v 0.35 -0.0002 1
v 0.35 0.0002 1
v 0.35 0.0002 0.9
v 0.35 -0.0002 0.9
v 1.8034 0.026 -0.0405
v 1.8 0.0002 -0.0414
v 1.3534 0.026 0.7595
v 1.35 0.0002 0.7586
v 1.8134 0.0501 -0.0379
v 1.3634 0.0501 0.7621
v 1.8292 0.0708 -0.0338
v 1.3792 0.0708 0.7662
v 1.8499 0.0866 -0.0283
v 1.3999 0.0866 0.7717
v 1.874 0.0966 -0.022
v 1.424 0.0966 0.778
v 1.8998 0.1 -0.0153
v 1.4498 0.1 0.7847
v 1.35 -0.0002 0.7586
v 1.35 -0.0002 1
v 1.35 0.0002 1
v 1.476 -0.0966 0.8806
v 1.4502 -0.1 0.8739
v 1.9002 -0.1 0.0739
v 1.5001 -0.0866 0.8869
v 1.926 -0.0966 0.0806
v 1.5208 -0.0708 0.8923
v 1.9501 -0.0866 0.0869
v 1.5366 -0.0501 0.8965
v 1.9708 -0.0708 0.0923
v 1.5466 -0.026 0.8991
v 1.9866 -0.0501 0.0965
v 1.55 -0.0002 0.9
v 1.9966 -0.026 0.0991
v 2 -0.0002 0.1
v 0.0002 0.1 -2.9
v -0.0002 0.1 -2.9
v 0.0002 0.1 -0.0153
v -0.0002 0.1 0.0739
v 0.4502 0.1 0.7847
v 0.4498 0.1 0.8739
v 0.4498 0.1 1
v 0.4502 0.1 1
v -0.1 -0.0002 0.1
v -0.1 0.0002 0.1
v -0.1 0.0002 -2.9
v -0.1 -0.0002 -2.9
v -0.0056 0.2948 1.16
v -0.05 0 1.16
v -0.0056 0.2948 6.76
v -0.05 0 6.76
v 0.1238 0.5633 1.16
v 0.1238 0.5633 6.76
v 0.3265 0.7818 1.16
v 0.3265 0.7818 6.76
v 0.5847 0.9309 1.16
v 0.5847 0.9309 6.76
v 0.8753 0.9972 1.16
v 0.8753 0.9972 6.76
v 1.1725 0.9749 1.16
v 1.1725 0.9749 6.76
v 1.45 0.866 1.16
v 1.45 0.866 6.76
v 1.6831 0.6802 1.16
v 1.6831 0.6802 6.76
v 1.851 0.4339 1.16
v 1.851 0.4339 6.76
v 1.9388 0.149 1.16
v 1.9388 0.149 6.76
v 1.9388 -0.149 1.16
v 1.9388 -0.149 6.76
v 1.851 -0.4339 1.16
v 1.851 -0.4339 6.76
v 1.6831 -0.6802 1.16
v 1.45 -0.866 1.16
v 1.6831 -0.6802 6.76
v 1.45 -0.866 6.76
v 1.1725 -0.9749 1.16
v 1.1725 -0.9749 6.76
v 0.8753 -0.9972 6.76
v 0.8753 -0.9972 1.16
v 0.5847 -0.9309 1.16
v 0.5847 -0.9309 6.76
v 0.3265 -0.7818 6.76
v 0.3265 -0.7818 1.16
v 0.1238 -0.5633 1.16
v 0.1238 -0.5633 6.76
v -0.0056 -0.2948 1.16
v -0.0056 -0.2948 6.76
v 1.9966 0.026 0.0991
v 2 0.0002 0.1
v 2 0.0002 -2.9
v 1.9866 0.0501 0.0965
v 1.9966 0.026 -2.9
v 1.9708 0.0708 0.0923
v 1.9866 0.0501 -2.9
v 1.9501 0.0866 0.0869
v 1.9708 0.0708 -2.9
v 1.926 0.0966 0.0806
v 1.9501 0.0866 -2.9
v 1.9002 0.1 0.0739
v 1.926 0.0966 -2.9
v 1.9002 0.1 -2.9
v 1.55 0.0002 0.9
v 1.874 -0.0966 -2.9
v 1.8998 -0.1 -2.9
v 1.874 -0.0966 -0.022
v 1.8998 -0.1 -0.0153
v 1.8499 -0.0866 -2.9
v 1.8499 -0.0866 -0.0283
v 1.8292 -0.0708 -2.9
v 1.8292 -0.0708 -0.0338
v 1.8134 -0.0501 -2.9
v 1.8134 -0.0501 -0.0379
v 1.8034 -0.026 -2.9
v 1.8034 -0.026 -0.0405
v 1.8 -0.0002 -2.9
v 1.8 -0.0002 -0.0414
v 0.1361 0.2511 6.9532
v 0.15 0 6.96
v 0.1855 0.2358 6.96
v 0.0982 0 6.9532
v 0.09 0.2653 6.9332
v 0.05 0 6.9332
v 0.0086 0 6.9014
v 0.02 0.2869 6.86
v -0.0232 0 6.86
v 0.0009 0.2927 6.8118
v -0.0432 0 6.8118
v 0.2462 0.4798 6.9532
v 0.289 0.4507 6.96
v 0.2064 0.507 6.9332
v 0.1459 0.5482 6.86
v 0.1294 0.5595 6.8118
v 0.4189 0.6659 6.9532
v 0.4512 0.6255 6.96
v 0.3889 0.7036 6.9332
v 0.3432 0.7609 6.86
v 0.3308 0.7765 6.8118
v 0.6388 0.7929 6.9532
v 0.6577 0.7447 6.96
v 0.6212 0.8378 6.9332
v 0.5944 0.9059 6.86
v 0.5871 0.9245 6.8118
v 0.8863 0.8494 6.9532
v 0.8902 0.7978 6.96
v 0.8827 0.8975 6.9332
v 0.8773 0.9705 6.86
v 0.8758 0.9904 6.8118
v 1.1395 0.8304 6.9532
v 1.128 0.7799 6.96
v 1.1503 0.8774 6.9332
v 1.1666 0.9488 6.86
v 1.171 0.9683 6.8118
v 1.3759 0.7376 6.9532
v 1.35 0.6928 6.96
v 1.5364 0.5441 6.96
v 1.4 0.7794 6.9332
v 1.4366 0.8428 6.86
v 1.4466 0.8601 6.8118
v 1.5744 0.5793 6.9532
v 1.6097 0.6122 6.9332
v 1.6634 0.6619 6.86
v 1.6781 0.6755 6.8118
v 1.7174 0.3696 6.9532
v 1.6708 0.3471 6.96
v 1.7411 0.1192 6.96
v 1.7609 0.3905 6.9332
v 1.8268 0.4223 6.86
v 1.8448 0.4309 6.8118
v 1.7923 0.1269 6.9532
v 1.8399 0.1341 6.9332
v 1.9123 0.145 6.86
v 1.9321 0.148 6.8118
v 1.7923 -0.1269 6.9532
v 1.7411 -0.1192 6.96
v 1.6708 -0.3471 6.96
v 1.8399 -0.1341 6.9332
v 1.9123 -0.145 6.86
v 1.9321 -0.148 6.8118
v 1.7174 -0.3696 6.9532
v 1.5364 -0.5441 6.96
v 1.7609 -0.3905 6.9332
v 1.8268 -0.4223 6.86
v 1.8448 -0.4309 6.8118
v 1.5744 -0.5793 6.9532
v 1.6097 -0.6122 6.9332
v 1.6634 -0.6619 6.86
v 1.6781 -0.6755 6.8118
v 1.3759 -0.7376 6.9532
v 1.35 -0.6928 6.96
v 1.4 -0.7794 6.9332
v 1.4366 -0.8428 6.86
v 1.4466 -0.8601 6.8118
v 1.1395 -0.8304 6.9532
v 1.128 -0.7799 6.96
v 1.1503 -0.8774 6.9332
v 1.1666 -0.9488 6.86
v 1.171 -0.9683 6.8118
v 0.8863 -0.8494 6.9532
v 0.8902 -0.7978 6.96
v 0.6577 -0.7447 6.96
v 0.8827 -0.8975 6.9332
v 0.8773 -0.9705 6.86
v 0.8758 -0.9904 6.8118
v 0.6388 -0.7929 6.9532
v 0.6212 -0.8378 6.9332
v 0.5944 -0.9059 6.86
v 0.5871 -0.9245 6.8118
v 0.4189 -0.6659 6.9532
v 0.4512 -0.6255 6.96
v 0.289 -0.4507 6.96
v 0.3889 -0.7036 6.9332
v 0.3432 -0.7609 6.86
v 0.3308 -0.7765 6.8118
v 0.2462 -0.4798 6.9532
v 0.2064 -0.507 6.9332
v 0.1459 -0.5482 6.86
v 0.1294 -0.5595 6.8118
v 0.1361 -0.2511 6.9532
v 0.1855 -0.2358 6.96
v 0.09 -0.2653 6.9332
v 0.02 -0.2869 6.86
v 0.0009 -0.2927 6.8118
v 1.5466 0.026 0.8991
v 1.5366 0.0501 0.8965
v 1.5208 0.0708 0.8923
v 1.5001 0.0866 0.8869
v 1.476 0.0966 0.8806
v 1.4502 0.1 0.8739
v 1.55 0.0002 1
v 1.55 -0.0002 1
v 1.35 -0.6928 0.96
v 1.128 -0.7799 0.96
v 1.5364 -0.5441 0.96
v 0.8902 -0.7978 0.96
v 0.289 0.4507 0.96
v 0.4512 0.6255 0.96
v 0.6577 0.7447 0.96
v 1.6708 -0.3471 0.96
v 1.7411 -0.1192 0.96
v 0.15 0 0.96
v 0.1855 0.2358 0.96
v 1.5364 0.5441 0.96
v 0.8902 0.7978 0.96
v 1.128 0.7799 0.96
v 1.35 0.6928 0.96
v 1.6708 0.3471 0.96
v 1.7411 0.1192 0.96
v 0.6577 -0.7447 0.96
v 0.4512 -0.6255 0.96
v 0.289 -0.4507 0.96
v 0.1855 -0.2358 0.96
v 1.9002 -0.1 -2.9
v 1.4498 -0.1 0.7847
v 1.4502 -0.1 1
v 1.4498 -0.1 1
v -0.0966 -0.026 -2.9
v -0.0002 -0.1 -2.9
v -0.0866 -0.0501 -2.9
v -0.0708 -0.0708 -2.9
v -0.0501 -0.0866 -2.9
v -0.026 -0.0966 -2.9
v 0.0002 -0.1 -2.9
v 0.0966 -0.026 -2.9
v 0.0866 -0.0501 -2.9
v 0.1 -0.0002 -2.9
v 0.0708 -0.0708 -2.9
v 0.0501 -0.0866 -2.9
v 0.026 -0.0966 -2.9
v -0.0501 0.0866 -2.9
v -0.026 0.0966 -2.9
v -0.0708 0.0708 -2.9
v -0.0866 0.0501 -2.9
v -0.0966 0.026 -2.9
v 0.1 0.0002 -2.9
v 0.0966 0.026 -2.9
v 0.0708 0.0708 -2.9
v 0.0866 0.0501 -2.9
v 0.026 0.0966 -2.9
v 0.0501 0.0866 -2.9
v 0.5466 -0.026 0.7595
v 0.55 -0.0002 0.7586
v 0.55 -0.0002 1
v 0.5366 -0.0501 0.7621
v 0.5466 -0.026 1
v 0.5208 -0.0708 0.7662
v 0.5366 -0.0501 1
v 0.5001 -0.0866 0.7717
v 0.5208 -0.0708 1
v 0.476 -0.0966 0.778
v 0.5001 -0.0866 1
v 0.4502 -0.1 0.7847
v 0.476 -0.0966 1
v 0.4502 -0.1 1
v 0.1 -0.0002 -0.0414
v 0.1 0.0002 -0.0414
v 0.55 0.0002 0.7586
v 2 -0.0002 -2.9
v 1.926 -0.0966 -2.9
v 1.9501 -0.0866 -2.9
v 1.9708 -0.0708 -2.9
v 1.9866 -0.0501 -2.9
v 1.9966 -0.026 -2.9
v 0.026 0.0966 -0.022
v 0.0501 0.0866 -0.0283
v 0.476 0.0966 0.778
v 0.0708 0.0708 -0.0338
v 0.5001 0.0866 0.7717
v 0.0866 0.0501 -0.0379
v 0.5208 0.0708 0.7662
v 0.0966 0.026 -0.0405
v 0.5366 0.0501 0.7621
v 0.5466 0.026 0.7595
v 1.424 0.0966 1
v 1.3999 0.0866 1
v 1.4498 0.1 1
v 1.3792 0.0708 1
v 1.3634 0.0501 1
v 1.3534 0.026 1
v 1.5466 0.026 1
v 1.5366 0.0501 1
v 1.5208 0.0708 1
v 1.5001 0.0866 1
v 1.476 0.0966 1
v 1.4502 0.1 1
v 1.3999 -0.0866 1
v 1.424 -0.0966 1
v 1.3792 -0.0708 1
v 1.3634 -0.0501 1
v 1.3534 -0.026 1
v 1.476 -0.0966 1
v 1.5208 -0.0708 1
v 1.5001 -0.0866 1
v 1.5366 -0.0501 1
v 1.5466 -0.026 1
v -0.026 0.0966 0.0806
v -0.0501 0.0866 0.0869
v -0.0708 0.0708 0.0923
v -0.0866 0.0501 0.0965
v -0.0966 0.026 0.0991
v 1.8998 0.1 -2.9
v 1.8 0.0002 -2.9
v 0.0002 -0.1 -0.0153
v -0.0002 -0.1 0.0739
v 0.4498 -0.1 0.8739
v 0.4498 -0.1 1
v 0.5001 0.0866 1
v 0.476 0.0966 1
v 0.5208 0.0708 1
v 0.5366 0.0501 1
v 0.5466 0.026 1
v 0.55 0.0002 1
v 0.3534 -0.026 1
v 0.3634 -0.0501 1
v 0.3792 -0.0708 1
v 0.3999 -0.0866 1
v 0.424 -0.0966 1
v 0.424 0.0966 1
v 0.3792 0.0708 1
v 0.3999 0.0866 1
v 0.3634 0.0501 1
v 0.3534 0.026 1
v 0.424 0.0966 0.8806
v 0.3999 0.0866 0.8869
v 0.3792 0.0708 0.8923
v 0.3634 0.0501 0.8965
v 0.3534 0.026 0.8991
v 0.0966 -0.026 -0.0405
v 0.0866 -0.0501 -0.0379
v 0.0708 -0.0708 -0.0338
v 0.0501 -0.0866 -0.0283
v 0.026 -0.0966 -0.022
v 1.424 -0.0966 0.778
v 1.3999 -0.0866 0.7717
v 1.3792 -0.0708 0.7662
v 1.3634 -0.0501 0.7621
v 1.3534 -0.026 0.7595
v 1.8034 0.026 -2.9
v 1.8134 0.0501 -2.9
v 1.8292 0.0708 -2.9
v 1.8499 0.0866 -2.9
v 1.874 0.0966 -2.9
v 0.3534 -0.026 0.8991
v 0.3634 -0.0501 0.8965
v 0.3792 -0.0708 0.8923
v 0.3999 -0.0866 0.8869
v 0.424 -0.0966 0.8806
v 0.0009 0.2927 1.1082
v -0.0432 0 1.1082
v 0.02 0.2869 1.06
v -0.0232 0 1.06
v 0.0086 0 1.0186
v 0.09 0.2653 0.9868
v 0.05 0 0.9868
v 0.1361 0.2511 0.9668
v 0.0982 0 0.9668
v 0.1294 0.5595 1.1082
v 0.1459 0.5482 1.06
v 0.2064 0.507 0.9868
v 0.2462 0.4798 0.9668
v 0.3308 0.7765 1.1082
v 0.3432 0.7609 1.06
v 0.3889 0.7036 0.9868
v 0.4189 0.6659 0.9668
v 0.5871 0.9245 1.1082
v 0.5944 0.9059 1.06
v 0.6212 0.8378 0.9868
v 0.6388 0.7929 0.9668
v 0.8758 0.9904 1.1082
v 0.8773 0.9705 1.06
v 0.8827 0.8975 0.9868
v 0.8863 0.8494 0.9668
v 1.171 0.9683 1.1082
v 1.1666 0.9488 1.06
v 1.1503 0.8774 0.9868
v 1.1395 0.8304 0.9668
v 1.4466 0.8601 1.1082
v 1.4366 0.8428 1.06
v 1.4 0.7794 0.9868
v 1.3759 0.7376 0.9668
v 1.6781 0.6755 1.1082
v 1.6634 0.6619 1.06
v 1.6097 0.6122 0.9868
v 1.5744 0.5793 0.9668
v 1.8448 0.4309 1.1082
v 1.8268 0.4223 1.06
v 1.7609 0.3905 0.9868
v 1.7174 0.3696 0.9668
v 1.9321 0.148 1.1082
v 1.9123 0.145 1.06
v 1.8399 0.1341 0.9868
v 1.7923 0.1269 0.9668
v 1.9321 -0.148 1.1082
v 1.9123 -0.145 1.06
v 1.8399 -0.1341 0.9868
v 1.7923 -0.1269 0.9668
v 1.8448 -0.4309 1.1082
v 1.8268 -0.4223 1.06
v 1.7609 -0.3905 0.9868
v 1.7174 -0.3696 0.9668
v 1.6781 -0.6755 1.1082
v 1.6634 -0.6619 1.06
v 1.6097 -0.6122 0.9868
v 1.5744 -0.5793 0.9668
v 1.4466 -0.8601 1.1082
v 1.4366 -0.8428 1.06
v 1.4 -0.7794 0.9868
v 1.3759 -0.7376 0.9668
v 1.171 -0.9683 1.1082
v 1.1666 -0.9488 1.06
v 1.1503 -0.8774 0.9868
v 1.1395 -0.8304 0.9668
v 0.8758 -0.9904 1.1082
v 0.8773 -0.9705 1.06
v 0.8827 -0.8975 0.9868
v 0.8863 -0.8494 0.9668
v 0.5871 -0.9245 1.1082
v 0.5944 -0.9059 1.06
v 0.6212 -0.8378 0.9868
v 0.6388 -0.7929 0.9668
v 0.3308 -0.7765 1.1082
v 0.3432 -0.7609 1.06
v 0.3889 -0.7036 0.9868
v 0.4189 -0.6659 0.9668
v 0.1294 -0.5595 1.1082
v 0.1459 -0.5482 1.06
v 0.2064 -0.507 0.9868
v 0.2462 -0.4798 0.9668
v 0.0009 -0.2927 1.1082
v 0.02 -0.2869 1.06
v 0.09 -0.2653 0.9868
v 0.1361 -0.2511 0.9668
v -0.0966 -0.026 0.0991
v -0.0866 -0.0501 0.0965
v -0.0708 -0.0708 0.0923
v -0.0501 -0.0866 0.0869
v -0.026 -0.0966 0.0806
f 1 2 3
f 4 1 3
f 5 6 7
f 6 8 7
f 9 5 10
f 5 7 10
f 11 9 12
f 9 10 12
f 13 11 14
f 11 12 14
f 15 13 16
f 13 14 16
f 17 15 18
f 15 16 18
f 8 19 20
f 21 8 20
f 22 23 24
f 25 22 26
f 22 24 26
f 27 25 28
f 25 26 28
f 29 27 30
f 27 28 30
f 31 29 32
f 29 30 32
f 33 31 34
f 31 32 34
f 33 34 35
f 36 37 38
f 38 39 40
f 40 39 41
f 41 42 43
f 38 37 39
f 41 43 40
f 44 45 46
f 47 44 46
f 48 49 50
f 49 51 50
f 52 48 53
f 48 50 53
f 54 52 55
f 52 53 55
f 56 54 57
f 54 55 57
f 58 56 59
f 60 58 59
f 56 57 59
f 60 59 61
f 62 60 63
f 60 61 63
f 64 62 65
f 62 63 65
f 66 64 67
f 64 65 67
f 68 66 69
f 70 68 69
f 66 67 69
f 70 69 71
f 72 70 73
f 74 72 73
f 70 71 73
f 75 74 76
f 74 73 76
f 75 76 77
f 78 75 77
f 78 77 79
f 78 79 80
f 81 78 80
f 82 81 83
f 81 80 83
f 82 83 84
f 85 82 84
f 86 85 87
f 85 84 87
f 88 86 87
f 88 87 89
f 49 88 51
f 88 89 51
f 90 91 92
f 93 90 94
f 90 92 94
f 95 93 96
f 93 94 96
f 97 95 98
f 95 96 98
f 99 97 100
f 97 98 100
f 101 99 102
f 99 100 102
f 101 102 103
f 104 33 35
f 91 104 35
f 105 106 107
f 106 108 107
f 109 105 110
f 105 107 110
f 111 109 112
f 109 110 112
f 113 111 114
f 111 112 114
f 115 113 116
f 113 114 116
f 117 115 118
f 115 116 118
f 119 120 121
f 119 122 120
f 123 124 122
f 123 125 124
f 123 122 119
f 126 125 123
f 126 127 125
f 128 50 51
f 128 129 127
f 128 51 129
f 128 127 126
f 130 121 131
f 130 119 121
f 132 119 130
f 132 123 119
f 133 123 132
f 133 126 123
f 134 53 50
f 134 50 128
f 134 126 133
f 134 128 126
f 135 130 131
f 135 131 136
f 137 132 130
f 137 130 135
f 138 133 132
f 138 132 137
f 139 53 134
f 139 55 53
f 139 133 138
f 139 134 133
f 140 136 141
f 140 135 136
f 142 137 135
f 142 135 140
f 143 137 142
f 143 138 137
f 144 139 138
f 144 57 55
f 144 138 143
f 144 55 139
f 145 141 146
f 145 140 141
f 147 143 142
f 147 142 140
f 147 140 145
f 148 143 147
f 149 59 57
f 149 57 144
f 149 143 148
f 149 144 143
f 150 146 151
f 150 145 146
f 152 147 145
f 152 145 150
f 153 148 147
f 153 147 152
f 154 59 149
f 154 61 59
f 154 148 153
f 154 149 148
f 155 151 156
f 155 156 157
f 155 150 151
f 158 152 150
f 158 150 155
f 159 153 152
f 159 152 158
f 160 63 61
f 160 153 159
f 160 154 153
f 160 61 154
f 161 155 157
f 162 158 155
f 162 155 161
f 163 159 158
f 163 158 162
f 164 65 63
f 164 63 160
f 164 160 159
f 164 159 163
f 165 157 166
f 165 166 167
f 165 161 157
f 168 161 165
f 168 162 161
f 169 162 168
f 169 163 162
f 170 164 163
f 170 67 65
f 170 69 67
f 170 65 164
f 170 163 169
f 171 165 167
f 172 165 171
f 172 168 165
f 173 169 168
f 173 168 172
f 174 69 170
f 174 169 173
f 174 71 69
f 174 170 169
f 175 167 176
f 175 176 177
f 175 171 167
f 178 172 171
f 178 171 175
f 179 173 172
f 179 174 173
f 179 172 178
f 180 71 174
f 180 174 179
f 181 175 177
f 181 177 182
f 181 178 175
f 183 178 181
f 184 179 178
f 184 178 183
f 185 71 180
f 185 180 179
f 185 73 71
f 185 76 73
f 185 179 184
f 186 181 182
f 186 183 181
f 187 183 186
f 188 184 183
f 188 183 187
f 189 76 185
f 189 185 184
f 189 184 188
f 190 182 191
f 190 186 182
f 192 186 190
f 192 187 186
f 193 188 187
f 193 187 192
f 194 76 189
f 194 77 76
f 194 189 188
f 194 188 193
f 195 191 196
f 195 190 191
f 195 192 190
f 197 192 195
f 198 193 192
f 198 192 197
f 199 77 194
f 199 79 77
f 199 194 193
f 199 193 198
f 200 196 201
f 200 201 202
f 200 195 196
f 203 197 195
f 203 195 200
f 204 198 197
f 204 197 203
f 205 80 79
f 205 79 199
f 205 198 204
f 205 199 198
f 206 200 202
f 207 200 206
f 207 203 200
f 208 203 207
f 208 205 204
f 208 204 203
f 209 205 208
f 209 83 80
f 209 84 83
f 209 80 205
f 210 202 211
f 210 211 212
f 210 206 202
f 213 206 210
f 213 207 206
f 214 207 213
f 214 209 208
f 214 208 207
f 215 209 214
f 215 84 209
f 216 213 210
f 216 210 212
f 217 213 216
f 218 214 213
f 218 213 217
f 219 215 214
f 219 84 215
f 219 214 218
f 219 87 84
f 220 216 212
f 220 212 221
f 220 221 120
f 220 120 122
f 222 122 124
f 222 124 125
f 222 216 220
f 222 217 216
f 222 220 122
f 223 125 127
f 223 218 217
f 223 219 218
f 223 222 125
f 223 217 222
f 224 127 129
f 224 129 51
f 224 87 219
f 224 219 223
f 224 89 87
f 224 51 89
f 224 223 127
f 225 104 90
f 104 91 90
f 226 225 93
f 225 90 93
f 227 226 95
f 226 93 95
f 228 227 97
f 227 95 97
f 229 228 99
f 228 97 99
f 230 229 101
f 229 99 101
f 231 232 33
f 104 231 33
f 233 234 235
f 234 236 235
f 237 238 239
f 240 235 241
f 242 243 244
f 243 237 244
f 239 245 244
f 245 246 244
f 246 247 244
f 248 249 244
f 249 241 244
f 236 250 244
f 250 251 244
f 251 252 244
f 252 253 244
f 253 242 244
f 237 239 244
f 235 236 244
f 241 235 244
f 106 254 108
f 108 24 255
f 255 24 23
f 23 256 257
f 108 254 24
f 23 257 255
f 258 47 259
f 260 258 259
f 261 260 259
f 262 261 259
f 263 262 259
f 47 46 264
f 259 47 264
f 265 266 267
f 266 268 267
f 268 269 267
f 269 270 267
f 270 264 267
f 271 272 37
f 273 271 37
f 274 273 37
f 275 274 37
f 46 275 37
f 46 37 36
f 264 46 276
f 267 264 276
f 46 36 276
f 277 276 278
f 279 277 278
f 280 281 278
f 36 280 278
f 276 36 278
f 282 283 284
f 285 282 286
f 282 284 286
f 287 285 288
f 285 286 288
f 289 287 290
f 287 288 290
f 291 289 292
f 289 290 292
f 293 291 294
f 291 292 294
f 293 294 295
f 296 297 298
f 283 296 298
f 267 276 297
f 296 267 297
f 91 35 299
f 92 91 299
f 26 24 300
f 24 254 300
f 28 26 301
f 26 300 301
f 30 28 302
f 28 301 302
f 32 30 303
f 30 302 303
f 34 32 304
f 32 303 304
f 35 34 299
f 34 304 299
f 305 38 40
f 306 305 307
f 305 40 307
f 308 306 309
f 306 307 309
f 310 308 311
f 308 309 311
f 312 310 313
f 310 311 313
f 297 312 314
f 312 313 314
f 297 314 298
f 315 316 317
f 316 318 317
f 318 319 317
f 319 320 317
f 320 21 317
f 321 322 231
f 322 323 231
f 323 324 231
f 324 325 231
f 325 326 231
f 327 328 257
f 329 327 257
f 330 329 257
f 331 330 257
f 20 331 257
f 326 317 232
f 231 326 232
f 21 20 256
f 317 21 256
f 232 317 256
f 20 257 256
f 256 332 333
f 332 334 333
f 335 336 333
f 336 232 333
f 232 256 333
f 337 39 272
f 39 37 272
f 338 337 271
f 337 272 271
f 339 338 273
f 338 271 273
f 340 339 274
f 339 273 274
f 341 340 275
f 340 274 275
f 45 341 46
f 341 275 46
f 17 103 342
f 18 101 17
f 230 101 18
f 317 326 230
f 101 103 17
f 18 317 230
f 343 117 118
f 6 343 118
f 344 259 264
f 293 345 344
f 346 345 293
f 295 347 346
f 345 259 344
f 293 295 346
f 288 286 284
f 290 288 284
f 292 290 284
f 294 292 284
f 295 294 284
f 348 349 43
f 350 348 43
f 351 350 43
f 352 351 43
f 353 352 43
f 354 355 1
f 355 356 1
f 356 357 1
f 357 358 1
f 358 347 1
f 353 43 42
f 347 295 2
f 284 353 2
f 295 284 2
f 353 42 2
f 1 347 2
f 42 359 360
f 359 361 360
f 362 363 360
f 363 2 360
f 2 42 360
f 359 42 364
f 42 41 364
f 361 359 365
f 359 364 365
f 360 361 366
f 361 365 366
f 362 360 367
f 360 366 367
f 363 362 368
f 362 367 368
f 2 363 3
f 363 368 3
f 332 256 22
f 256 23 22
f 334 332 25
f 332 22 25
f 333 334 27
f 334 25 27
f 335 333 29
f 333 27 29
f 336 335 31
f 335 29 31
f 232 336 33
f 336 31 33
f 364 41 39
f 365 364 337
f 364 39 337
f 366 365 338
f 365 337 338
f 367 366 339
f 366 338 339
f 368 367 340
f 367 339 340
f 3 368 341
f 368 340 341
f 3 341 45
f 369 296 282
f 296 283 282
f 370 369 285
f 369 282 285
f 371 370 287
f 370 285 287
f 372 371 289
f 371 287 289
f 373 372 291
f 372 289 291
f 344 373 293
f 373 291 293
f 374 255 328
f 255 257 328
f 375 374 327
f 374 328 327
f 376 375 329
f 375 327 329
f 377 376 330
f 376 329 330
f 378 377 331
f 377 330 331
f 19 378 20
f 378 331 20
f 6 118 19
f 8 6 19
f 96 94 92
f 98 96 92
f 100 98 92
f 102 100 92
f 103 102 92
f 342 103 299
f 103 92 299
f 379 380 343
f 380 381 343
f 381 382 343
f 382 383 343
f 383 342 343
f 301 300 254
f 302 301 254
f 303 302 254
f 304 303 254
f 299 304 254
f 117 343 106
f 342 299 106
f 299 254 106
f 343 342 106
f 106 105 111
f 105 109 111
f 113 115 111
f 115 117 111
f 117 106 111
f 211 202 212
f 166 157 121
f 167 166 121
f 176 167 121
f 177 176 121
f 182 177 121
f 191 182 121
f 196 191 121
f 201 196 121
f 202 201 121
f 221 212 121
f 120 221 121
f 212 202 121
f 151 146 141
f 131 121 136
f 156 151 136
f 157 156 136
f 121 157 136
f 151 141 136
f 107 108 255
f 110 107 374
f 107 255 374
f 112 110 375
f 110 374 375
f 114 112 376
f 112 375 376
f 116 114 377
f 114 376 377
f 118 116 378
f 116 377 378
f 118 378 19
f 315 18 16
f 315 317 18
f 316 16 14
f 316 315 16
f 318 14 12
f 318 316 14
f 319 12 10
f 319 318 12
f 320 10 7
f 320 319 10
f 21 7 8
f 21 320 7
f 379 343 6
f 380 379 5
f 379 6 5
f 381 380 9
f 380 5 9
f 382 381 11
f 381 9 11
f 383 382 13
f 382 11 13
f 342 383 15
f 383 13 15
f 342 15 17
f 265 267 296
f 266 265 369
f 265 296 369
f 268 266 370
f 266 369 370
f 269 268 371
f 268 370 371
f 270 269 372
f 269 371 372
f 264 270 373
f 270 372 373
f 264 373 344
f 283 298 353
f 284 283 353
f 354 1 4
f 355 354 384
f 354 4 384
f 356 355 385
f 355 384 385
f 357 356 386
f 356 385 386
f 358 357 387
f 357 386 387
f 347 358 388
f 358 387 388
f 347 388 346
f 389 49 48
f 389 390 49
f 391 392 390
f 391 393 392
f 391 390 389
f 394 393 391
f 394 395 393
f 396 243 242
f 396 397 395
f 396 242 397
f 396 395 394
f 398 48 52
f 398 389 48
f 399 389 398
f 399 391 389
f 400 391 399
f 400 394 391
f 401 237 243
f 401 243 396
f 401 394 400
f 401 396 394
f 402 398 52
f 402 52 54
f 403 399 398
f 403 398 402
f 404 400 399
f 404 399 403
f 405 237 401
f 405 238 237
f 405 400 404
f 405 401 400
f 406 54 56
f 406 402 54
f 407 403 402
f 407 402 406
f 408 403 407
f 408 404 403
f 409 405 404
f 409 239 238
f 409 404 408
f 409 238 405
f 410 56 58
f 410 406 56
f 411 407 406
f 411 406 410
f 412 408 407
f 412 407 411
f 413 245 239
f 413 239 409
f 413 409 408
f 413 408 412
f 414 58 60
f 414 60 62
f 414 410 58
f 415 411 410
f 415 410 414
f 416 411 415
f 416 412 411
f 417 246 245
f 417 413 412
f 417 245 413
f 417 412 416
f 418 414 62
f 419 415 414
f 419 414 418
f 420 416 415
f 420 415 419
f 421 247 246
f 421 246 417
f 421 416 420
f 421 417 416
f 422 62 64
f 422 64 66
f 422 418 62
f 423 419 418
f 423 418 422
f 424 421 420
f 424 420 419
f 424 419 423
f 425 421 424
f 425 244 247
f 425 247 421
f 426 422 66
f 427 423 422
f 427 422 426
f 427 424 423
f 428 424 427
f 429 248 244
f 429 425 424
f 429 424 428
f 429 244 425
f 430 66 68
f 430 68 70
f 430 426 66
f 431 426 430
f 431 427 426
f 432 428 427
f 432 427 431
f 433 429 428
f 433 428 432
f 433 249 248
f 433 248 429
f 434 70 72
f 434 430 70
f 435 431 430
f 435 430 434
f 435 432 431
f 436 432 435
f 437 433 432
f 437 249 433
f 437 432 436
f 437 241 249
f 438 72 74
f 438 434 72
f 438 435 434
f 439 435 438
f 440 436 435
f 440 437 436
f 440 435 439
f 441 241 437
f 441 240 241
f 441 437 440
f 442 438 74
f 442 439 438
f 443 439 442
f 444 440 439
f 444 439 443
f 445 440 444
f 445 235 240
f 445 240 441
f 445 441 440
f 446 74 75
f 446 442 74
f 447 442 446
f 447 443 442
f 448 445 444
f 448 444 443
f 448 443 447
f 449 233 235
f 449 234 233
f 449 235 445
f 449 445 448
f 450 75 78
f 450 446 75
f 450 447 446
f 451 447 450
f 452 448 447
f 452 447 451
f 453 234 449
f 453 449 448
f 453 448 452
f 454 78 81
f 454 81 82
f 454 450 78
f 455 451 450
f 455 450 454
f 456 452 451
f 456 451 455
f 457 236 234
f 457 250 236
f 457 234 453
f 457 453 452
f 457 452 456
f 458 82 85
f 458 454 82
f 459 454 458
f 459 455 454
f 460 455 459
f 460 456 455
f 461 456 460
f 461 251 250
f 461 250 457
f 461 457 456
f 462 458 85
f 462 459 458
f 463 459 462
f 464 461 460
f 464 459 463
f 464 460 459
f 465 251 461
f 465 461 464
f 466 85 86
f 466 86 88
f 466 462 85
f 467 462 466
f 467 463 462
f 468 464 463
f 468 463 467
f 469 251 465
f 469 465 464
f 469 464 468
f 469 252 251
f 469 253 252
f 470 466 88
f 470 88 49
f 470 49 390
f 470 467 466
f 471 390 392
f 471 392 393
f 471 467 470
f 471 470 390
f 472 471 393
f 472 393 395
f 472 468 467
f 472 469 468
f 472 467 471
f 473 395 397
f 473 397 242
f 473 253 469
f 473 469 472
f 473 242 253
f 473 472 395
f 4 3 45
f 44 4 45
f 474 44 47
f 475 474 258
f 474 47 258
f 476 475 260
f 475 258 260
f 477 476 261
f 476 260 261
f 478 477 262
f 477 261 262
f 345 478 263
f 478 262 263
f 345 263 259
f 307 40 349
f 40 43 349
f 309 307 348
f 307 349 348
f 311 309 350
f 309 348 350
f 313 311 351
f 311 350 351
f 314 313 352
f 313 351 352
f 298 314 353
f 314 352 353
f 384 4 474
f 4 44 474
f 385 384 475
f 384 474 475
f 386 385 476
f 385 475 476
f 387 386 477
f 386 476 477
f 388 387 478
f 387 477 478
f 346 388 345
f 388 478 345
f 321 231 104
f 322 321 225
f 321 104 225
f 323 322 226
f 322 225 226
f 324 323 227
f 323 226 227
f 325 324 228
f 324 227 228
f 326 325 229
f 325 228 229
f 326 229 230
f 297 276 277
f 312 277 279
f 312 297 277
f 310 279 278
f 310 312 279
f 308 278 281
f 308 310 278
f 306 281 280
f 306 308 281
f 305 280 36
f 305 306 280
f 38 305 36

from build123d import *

# Parameters (mm, degrees)
PAD_DEPTH = 0.1
FILLET_R  = 0.0998


with BuildPart() as revolution:
    # Sketch002 → Revolution (revolve)
    with BuildSketch(Plane.XZ):
        with BuildLine():
            Line((0.15, 6.96), (0.95, 6.96))
            Line((0.95, 0.96), (0.95, 6.96))
            Line((0.95, 0.96), (0.15, 0.96))
            ThreePointArc((-0.05, 1.16), (0.008579, 1.018579), (0.15, 0.96))
            Line((-0.05, 1.16), (-0.05, 6.76))
            ThreePointArc((0.15, 6.96), (0.008579, 6.901421), (-0.05, 6.76))
        make_face()
    revolve(axis=Axis((0.95, 0, 6.96), (0, 0, -1)))


with BuildPart() as fillet_body:
    # Sketch → Pad (new body, symmetric)
    with BuildSketch(Plane.XZ):
        Polygon((0.1, -2.9), (0.1, -0.041421), (0.55, 0.758579), (0.55, 1), (0.35, 1), (0.35, 0.9), (-0.1, 0.1), (-0.1, -2.9), align=None)
        Polygon((1.35, 1), (1.55, 1), (1.55, 0.9), (2, 0.1), (2, -2.9), (1.8, -2.9), (1.8, -0.041421), (1.35, 0.758579), align=None)
    extrude(amount=PAD_DEPTH, both=True)

    # Fillet
    fillet_edges = [fillet_body.edges().sort_by_distance(p)[0] for p in [
        (0.125, -0.1, 0.5),
        (0.35, -0.1, 0.95),
        (0.55, -0.1, 0.879289),
        (0.325, -0.1, 0.358579),
        (0.1, -0.1, -1.470711),
        (-0.1, -0.1, -1.4),
        (0.1, 0.1, -1.470711),
        (0.325, 0.1, 0.358579),
        (0.55, 0.1, 0.879289),
        (1.575, -0.1, 0.358579),
        (1.35, -0.1, 0.879289),
        (1.8, -0.1, -1.470711),
        (2, -0.1, -1.4),
        (1.775, -0.1, 0.5),
        (1.55, -0.1, 0.95),
        (1.55, 0.1, 0.95),
        (1.775, 0.1, 0.5),
        (2, 0.1, -1.4),
        (1.8, 0.1, -1.470711),
        (1.575, 0.1, 0.358579),
        (1.35, 0.1, 0.879289),
        (0.35, 0.1, 0.95),
        (-0.1, 0.1, -1.4),
        (0.125, 0.1, 0.5),
    ]]
    fillet(fillet_edges, radius=FILLET_R)


solid = Compound([revolution.part, fillet_body.part])
